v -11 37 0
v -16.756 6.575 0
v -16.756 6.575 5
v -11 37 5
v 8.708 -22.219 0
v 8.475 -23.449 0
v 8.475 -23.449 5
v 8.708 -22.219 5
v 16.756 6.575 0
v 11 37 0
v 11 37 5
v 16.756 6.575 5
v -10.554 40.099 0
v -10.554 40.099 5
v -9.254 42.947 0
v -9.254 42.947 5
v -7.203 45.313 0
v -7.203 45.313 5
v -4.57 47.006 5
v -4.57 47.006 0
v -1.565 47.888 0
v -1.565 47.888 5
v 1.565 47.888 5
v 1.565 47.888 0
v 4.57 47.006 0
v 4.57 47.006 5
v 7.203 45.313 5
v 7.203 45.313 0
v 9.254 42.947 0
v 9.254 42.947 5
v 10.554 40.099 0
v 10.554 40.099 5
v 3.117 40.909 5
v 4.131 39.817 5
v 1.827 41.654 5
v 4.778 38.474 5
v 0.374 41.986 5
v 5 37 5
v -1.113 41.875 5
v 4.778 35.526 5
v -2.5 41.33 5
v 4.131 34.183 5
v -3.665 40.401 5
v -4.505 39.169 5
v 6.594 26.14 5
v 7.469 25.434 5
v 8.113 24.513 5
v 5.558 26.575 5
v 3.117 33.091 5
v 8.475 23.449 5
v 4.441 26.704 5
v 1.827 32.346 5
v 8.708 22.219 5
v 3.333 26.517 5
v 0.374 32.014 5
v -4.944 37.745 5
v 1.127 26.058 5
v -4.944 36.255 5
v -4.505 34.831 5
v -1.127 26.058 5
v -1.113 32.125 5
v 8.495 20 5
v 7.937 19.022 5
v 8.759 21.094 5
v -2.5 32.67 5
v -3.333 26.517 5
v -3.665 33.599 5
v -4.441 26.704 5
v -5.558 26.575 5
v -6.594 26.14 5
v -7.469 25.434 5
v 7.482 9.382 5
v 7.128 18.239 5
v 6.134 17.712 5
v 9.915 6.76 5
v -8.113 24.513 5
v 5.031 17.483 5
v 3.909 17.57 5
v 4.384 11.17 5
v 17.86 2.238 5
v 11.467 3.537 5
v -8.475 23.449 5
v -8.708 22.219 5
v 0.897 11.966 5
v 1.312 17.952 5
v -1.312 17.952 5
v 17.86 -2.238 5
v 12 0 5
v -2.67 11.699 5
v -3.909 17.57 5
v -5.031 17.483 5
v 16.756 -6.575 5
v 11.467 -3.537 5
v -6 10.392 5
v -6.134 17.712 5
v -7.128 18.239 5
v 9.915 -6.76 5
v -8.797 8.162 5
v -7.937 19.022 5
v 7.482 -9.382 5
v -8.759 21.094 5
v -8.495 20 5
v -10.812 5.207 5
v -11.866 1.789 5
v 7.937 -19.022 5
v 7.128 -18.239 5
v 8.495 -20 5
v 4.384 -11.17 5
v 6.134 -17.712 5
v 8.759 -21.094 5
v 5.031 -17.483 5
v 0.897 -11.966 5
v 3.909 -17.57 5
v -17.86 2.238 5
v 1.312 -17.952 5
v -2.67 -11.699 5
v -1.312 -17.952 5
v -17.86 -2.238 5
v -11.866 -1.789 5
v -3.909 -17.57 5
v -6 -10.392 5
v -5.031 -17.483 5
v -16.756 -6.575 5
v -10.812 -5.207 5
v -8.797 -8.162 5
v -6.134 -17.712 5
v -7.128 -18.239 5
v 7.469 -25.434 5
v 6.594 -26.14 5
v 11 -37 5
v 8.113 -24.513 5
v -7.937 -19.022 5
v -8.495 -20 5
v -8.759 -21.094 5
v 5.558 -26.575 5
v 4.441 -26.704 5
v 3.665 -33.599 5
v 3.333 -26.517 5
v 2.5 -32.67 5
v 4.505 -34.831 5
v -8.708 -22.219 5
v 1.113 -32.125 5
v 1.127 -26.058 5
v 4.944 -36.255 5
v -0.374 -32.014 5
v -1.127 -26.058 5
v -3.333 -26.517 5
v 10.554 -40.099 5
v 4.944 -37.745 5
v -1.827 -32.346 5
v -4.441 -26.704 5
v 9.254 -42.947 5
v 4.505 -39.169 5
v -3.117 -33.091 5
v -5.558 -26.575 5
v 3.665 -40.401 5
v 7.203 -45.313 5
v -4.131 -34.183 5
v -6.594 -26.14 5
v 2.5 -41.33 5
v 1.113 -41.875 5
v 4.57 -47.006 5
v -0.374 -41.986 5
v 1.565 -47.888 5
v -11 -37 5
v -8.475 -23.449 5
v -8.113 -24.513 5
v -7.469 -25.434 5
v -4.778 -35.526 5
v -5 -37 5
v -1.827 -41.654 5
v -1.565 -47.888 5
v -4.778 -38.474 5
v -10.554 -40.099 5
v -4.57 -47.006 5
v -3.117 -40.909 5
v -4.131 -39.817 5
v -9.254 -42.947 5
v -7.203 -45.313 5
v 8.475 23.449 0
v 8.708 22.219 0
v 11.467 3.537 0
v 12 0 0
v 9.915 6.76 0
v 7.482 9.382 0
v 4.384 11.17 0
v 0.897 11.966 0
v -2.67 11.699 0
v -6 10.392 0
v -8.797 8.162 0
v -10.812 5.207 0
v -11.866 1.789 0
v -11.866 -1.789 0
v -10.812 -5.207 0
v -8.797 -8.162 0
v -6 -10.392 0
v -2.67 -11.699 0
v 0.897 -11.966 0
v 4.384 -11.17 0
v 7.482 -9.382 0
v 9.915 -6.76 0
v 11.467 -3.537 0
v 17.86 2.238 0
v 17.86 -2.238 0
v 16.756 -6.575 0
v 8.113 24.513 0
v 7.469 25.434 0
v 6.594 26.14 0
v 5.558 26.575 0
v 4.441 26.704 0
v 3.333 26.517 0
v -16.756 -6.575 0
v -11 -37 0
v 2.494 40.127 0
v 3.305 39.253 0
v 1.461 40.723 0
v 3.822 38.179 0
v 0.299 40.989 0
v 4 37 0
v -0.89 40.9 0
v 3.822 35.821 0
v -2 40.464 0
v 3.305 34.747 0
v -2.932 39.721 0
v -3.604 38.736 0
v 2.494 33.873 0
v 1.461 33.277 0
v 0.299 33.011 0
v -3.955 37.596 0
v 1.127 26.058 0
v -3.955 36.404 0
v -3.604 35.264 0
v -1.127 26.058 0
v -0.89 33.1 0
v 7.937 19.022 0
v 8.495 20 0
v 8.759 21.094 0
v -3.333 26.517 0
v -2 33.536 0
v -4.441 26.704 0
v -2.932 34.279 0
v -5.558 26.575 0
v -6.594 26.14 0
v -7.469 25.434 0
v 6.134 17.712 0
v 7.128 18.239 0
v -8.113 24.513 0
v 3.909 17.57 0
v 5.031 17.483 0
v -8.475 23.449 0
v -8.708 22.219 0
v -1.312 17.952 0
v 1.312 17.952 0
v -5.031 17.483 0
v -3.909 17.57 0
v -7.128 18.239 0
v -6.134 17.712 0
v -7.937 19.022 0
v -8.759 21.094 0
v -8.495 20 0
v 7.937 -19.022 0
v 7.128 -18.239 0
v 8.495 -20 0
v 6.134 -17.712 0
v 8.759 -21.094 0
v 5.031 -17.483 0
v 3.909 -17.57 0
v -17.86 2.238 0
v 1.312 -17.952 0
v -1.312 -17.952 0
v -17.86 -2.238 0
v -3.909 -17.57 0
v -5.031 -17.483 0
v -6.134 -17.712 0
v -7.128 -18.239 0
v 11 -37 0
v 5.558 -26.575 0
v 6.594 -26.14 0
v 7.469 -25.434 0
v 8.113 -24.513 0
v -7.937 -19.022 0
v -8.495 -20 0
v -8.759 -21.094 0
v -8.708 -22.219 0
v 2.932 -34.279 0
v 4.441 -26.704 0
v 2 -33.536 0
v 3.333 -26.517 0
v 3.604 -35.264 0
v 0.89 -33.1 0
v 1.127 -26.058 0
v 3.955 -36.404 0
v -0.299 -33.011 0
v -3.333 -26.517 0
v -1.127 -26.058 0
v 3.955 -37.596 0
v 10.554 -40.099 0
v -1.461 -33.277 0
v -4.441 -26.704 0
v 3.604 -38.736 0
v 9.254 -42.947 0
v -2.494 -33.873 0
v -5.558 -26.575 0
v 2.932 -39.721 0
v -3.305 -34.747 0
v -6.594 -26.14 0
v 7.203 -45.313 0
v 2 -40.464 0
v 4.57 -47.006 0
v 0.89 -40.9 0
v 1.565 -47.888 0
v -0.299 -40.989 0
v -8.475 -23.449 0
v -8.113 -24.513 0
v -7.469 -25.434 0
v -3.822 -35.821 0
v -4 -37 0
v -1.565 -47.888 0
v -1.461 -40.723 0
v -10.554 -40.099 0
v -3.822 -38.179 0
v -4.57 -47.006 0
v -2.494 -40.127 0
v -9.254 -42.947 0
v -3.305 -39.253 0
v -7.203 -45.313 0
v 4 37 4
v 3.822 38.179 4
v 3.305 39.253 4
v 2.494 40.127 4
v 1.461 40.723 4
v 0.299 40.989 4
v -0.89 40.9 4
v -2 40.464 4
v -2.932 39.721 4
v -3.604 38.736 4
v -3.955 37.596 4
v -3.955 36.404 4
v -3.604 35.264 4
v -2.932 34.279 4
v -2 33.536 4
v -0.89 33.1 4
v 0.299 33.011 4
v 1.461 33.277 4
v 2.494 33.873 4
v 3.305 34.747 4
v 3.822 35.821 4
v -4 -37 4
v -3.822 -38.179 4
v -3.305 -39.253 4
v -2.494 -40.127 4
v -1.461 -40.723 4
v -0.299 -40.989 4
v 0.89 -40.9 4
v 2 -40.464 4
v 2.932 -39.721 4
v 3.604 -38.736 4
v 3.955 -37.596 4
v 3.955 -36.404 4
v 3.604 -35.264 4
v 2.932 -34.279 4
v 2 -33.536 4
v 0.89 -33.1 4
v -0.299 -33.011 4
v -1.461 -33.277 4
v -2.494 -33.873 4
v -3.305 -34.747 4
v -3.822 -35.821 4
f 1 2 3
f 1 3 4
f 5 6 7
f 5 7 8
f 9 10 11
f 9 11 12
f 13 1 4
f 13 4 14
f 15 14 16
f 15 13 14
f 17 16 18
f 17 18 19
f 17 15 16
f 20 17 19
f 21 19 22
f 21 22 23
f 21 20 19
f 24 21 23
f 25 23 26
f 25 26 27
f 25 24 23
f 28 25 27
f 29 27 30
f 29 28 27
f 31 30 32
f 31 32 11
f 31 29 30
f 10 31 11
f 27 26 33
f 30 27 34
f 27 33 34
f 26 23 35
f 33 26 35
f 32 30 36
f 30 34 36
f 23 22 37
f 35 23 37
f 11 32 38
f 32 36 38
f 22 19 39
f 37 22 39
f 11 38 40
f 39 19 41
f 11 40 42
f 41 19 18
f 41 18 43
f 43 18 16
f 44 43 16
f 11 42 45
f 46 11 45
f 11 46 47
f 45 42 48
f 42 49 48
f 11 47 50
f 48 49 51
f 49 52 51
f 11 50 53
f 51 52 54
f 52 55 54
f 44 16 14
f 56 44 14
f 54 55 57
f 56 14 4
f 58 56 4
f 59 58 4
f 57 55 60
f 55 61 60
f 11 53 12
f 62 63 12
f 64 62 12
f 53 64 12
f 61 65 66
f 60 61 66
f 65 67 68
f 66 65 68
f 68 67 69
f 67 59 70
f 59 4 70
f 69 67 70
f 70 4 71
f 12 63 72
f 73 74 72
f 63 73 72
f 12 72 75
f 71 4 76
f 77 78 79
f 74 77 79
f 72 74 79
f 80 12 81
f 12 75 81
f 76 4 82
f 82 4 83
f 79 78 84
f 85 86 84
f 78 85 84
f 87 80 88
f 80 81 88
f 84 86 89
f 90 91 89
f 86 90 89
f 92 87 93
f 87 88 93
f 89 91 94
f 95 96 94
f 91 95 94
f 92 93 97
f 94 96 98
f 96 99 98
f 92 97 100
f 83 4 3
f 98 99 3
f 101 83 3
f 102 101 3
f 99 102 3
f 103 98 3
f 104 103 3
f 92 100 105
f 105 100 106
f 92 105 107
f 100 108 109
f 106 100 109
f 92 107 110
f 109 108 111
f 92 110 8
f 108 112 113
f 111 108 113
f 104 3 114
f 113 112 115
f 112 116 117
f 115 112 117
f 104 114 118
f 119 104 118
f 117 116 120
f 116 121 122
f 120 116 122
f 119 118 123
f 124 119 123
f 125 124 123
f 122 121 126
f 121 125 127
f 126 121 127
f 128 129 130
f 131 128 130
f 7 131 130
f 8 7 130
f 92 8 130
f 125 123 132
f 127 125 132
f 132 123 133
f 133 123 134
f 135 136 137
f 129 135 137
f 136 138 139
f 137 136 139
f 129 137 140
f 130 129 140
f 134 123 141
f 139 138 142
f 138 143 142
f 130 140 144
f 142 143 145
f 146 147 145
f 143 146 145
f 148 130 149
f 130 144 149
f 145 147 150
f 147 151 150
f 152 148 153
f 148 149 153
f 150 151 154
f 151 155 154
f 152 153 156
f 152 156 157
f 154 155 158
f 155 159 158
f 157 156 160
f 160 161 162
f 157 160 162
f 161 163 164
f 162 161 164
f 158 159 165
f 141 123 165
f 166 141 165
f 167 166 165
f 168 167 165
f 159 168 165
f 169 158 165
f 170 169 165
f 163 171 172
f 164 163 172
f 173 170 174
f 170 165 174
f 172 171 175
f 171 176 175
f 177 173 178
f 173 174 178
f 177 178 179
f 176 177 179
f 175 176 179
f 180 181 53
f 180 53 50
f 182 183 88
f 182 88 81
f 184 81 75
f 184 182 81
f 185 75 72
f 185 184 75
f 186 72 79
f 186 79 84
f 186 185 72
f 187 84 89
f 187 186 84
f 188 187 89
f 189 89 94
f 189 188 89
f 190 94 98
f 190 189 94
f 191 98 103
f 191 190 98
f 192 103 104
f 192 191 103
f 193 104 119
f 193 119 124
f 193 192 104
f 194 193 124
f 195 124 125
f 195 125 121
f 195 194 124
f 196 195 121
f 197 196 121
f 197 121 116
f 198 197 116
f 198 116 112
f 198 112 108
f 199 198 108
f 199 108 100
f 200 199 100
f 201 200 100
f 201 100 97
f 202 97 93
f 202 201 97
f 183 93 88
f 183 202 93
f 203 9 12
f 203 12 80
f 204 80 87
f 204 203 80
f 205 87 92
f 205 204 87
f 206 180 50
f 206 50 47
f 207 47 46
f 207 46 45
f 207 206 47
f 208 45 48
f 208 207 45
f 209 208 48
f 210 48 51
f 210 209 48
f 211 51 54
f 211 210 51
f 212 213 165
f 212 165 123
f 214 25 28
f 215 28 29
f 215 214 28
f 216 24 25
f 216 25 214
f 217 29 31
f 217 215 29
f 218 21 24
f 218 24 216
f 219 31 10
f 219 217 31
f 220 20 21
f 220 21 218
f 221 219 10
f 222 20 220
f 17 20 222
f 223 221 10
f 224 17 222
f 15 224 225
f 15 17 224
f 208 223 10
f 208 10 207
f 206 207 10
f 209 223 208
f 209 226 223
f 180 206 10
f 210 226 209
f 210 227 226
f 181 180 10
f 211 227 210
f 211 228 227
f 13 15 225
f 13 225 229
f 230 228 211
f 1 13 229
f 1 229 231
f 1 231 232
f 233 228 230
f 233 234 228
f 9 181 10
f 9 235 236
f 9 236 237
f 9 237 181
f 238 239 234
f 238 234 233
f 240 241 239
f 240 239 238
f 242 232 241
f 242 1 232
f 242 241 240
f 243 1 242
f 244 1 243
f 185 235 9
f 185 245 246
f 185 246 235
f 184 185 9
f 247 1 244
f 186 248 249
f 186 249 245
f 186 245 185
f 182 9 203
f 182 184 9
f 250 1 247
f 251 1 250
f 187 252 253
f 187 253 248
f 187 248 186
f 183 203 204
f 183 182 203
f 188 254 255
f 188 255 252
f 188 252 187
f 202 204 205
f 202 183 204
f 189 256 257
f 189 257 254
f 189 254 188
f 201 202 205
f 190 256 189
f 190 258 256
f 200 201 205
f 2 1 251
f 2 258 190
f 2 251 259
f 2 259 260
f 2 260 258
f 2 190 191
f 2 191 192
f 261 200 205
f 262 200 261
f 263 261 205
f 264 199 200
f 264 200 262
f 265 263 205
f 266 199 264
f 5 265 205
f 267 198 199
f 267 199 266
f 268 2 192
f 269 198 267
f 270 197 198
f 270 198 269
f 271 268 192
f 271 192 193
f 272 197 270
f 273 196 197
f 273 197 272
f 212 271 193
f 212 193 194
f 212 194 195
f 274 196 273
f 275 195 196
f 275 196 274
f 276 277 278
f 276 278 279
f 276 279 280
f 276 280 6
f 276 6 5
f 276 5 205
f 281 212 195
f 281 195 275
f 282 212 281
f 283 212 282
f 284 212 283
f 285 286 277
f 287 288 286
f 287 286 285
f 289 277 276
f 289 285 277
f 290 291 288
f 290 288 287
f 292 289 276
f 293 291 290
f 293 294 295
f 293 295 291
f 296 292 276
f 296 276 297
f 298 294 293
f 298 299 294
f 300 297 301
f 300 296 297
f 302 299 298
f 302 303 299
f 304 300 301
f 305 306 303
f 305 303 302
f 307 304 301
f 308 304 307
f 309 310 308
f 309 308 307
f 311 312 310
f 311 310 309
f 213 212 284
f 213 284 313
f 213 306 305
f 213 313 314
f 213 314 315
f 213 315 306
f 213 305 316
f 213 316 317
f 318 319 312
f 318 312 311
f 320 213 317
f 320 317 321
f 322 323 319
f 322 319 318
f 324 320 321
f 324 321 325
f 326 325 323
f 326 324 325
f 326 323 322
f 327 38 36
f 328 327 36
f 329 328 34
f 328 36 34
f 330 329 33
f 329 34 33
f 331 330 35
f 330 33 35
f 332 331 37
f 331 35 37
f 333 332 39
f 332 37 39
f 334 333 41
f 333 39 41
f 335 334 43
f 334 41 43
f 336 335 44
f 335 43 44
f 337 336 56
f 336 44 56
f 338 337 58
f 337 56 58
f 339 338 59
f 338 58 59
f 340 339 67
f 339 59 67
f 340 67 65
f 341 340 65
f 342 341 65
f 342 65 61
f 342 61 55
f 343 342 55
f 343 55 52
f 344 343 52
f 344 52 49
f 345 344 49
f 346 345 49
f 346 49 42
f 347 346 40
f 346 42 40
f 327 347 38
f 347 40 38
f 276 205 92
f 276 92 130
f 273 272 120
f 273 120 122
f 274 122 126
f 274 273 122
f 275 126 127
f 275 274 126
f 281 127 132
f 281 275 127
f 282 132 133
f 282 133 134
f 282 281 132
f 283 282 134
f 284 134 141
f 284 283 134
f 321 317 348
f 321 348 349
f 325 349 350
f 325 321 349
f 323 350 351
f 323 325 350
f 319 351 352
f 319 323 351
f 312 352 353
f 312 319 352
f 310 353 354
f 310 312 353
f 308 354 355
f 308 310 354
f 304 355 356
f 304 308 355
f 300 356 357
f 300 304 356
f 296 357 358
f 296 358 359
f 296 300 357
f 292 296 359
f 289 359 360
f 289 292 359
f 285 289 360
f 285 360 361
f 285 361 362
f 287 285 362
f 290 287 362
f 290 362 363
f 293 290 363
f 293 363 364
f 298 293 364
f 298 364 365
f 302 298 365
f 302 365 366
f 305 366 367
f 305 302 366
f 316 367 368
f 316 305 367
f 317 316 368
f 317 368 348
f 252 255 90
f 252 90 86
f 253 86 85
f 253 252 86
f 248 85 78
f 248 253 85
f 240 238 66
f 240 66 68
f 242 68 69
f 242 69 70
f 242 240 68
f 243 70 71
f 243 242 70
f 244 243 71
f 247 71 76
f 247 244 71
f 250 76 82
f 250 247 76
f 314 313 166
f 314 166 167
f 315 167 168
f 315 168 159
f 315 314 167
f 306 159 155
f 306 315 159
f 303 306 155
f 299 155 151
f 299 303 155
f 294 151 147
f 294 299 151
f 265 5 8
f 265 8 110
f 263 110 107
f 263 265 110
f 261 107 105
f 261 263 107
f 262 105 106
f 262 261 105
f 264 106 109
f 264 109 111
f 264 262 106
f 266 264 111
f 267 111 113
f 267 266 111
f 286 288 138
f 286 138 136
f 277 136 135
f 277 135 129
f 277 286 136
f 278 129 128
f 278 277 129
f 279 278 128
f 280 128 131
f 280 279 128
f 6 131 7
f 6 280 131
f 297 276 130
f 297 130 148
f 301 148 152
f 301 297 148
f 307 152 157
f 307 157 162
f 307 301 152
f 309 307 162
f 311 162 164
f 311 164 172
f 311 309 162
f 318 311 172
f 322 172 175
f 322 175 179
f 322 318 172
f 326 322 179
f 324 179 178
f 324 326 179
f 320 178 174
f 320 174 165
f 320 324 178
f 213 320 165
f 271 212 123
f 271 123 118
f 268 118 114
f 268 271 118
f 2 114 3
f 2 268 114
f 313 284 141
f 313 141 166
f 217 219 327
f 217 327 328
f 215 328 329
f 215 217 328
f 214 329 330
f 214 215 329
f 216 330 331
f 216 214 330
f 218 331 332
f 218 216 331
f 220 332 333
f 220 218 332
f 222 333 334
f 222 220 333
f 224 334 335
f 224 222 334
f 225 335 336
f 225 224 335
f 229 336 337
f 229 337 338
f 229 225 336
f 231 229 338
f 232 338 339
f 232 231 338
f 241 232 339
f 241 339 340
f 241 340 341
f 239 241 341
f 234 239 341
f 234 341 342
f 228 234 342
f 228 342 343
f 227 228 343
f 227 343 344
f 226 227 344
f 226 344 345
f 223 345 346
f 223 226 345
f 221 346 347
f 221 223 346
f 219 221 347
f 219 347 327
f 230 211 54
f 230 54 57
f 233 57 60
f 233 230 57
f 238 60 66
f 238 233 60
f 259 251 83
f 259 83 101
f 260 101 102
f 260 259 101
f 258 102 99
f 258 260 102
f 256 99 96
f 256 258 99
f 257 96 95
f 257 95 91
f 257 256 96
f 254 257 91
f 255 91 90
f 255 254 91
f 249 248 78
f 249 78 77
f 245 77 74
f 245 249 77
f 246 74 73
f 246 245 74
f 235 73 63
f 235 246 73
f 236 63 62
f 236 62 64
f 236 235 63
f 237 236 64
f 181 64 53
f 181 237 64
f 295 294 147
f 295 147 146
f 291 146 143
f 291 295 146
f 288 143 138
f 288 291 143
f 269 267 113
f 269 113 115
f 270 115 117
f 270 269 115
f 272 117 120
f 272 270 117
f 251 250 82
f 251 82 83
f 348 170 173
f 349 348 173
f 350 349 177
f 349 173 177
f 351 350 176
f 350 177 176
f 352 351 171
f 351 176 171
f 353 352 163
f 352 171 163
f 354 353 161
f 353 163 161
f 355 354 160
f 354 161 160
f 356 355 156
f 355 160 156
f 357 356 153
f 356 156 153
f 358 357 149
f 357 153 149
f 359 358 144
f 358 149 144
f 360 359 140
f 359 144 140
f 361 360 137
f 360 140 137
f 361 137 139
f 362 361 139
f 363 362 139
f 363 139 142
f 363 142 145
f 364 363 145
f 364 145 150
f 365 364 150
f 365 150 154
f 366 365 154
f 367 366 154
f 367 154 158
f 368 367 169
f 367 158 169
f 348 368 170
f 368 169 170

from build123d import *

# Parameters (mm, degrees)
SKETCH1_R           = 12
SKETCH1_R_2         = 4
BOSS_EXTRUDE1_DEPTH = 5
CHAMFER1_SIZE       = 1


with BuildPart() as part:
    # Sketch1 → Boss-Extrude1 (new body)
    with BuildSketch(Plane(origin=(0, 0, 0), x_dir=(0, 1, 0), z_dir=(0, 0, 1))):
        with BuildLine():
            Line((6.575458392, 16.755994358), (37, 11))
            ThreePointArc((37, 11), (48, 0), (37, -11))
            Line((37, -11), (6.575458392, -16.755994358))
            ThreePointArc((6.575458392, -16.755994358), (0, -18), (-6.575458392, -16.755994358))
            Line((-6.575458392, -16.755994358), (-37, -11))
            ThreePointArc((-37, -11), (-48, 0), (-37, 11))
            Line((-37, 11), (-6.575458392, 16.755994358))
            ThreePointArc((-6.575458392, 16.755994358), (0, 18), (6.575458392, 16.755994358))
        make_face()
        with Locations(Location((0, 0, 0), (0, 0, 270))):
            Circle(SKETCH1_R, mode=Mode.SUBTRACT)
        with Locations(Location((37, 0, 0), (0, 0, 270))):
            Circle(SKETCH1_R_2, mode=Mode.SUBTRACT)
        with Locations(Location((-37, 0, 0), (0, 0, 90))):
            Circle(SKETCH1_R_2, mode=Mode.SUBTRACT)
        with BuildLine():
            Line((23.448643014, 8.475075542), (22.218560764, 8.707793806))
            ThreePointArc((22.218560764, 8.707793806), (18.601781162, 7.560433495), (17.570449711, 3.908874128))
            ThreePointArc((17.570449711, 3.908874128), (18, 0), (17.570449711, -3.908874128))
            ThreePointArc((17.570449711, -3.908874128), (18.601781162, -7.560433495), (22.218560764, -8.707793806))
            Line((22.218560764, -8.707793806), (23.448643014, -8.475075542))
            ThreePointArc((23.448643014, -8.475075542), (26.140025122, -6.594459623), (26.517055984, -3.332849344))
            ThreePointArc((26.517055984, -3.332849344), (26, 0), (26.517055984, 3.332849344))
            ThreePointArc((26.517055984, 3.332849344), (26.140025122, 6.594459623), (23.448643014, 8.475075542))
        make_face(mode=Mode.SUBTRACT)
        with BuildLine():
            Line((-23.448643014, -8.475075542), (-22.218560764, -8.707793806))
            ThreePointArc((-22.218560764, -8.707793806), (-18.601781162, -7.560433495), (-17.570449711, -3.908874128))
            ThreePointArc((-17.570449711, -3.908874128), (-18, 0), (-17.570449711, 3.908874128))
            ThreePointArc((-17.570449711, 3.908874128), (-18.601781162, 7.560433495), (-22.218560764, 8.707793806))
            Line((-22.218560764, 8.707793806), (-23.448643014, 8.475075542))
            ThreePointArc((-23.448643014, 8.475075542), (-26.140025122, 6.594459623), (-26.517055984, 3.332849344))
            ThreePointArc((-26.517055984, 3.332849344), (-26, 0), (-26.517055984, -3.332849344))
            ThreePointArc((-26.517055984, -3.332849344), (-26.140025122, -6.594459623), (-23.448643014, -8.475075542))
        make_face(mode=Mode.SUBTRACT)
    extrude(amount=BOSS_EXTRUDE1_DEPTH)

    # Chamfer1
    chamfer1_edges = [part.edges().sort_by_distance(p)[0] for p in [
        (-4, 37, 5),
        (4, -37, 5),
    ]]
    chamfer(chamfer1_edges, length=CHAMFER1_SIZE)


solid = part.part
